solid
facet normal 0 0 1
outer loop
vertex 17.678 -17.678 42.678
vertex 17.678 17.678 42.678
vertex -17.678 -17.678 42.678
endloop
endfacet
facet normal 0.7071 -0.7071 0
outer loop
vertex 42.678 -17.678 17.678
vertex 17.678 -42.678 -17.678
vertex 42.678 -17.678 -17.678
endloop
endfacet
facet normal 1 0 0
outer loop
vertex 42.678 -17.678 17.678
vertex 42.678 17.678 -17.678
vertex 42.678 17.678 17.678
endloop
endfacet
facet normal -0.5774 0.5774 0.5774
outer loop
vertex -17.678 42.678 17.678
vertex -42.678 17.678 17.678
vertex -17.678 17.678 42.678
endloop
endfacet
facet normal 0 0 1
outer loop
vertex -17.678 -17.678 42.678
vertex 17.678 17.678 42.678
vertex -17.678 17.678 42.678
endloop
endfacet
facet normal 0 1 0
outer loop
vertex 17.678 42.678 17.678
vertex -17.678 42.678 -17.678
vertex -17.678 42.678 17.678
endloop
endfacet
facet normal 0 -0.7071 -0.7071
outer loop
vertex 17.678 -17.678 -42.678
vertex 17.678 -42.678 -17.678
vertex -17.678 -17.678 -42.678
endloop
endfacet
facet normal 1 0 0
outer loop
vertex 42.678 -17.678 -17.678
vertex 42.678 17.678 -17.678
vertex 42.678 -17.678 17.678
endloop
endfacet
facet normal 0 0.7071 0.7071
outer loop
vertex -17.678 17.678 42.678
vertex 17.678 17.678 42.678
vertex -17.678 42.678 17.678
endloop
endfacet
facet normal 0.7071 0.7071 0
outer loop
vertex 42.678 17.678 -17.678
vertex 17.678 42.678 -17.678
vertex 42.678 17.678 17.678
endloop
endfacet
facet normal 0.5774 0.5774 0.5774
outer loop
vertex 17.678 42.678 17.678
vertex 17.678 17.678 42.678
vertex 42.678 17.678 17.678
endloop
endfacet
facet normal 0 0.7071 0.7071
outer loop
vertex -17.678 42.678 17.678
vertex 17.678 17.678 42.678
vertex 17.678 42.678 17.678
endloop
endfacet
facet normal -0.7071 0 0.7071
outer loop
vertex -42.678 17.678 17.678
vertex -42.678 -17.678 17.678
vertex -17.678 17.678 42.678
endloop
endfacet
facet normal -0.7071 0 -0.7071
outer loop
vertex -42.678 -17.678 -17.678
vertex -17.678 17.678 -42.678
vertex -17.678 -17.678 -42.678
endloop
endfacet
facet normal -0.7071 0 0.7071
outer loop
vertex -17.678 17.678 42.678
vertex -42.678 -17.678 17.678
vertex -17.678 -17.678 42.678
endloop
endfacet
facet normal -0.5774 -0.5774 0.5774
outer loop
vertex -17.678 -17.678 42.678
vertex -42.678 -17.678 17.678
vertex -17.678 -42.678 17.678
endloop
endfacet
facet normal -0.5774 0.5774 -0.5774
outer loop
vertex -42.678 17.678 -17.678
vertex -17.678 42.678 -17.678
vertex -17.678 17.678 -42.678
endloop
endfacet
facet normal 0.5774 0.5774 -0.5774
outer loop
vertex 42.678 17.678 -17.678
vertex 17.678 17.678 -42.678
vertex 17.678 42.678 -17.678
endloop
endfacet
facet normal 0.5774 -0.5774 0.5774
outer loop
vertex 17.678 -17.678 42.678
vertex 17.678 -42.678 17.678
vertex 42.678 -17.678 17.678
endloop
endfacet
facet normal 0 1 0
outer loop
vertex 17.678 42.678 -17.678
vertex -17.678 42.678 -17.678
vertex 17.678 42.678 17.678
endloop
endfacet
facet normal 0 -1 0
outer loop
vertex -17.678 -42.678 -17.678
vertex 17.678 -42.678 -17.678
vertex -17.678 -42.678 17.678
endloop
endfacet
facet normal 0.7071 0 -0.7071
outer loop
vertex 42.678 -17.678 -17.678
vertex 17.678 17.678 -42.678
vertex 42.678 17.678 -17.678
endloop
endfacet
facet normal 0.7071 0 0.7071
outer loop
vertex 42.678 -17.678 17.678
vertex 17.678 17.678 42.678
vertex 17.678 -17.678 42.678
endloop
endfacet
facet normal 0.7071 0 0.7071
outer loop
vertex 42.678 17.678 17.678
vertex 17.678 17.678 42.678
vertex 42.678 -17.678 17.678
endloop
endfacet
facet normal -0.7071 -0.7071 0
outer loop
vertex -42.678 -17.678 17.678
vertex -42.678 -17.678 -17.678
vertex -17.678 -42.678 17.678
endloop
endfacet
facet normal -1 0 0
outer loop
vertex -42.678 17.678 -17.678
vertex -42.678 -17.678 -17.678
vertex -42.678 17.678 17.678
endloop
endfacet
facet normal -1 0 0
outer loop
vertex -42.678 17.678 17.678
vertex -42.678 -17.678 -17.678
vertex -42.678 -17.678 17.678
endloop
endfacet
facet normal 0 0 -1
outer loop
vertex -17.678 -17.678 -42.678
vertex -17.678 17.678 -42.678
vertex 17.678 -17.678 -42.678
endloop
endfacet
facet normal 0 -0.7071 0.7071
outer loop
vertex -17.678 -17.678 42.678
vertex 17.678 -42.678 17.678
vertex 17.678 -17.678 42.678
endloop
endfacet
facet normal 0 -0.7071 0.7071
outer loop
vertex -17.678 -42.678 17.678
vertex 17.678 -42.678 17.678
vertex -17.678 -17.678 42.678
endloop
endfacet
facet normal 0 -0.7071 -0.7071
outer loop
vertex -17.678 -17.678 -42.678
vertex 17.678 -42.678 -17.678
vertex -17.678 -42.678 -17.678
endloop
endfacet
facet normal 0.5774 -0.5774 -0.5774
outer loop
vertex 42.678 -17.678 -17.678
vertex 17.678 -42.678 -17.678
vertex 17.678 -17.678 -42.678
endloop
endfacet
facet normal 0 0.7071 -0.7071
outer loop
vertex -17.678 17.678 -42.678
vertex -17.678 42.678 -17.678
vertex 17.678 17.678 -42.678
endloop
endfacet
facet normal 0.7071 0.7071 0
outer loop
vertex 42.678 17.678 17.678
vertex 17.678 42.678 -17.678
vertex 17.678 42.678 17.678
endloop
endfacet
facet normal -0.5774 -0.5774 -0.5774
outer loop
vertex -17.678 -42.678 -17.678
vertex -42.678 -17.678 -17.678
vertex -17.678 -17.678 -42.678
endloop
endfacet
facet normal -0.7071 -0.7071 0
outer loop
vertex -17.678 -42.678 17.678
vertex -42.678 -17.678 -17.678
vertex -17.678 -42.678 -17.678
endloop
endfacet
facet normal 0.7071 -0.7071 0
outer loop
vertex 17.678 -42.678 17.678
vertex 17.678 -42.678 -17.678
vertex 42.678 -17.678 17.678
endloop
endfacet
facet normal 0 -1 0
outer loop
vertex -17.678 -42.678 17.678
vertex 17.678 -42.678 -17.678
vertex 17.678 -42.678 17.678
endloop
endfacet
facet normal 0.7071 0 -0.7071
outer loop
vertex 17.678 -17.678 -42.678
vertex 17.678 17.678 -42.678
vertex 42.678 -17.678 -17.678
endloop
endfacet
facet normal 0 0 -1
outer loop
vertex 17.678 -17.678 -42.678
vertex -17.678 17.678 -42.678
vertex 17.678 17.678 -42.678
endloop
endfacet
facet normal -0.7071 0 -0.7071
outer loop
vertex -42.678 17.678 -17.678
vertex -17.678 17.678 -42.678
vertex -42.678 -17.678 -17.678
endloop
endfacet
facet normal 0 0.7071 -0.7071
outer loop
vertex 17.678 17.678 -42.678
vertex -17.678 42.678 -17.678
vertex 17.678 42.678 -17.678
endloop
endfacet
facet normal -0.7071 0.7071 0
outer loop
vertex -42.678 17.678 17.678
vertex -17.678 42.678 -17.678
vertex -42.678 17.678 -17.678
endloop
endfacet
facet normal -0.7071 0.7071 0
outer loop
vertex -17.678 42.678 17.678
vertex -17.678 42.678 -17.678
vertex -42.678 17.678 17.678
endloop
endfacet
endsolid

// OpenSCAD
scale(25/sqrt(2))
minkowski() {
    cube([2,2,2], center=true);
    scale(sqrt(2)) polyhedron(
        points=[
            [1,0,0],
            [-1,0,0],
            [0,1,0],
            [0,-1,0],
            [0,0,1],
            [0,0,-1]],
        faces=[
            [0,2,4],
            [2,0,5],
            [4,2,1],
            [0,4,3],
            [2,5,1],
            [4,1,3],
            [0,3,5],
            [5,3,1]]);
}
